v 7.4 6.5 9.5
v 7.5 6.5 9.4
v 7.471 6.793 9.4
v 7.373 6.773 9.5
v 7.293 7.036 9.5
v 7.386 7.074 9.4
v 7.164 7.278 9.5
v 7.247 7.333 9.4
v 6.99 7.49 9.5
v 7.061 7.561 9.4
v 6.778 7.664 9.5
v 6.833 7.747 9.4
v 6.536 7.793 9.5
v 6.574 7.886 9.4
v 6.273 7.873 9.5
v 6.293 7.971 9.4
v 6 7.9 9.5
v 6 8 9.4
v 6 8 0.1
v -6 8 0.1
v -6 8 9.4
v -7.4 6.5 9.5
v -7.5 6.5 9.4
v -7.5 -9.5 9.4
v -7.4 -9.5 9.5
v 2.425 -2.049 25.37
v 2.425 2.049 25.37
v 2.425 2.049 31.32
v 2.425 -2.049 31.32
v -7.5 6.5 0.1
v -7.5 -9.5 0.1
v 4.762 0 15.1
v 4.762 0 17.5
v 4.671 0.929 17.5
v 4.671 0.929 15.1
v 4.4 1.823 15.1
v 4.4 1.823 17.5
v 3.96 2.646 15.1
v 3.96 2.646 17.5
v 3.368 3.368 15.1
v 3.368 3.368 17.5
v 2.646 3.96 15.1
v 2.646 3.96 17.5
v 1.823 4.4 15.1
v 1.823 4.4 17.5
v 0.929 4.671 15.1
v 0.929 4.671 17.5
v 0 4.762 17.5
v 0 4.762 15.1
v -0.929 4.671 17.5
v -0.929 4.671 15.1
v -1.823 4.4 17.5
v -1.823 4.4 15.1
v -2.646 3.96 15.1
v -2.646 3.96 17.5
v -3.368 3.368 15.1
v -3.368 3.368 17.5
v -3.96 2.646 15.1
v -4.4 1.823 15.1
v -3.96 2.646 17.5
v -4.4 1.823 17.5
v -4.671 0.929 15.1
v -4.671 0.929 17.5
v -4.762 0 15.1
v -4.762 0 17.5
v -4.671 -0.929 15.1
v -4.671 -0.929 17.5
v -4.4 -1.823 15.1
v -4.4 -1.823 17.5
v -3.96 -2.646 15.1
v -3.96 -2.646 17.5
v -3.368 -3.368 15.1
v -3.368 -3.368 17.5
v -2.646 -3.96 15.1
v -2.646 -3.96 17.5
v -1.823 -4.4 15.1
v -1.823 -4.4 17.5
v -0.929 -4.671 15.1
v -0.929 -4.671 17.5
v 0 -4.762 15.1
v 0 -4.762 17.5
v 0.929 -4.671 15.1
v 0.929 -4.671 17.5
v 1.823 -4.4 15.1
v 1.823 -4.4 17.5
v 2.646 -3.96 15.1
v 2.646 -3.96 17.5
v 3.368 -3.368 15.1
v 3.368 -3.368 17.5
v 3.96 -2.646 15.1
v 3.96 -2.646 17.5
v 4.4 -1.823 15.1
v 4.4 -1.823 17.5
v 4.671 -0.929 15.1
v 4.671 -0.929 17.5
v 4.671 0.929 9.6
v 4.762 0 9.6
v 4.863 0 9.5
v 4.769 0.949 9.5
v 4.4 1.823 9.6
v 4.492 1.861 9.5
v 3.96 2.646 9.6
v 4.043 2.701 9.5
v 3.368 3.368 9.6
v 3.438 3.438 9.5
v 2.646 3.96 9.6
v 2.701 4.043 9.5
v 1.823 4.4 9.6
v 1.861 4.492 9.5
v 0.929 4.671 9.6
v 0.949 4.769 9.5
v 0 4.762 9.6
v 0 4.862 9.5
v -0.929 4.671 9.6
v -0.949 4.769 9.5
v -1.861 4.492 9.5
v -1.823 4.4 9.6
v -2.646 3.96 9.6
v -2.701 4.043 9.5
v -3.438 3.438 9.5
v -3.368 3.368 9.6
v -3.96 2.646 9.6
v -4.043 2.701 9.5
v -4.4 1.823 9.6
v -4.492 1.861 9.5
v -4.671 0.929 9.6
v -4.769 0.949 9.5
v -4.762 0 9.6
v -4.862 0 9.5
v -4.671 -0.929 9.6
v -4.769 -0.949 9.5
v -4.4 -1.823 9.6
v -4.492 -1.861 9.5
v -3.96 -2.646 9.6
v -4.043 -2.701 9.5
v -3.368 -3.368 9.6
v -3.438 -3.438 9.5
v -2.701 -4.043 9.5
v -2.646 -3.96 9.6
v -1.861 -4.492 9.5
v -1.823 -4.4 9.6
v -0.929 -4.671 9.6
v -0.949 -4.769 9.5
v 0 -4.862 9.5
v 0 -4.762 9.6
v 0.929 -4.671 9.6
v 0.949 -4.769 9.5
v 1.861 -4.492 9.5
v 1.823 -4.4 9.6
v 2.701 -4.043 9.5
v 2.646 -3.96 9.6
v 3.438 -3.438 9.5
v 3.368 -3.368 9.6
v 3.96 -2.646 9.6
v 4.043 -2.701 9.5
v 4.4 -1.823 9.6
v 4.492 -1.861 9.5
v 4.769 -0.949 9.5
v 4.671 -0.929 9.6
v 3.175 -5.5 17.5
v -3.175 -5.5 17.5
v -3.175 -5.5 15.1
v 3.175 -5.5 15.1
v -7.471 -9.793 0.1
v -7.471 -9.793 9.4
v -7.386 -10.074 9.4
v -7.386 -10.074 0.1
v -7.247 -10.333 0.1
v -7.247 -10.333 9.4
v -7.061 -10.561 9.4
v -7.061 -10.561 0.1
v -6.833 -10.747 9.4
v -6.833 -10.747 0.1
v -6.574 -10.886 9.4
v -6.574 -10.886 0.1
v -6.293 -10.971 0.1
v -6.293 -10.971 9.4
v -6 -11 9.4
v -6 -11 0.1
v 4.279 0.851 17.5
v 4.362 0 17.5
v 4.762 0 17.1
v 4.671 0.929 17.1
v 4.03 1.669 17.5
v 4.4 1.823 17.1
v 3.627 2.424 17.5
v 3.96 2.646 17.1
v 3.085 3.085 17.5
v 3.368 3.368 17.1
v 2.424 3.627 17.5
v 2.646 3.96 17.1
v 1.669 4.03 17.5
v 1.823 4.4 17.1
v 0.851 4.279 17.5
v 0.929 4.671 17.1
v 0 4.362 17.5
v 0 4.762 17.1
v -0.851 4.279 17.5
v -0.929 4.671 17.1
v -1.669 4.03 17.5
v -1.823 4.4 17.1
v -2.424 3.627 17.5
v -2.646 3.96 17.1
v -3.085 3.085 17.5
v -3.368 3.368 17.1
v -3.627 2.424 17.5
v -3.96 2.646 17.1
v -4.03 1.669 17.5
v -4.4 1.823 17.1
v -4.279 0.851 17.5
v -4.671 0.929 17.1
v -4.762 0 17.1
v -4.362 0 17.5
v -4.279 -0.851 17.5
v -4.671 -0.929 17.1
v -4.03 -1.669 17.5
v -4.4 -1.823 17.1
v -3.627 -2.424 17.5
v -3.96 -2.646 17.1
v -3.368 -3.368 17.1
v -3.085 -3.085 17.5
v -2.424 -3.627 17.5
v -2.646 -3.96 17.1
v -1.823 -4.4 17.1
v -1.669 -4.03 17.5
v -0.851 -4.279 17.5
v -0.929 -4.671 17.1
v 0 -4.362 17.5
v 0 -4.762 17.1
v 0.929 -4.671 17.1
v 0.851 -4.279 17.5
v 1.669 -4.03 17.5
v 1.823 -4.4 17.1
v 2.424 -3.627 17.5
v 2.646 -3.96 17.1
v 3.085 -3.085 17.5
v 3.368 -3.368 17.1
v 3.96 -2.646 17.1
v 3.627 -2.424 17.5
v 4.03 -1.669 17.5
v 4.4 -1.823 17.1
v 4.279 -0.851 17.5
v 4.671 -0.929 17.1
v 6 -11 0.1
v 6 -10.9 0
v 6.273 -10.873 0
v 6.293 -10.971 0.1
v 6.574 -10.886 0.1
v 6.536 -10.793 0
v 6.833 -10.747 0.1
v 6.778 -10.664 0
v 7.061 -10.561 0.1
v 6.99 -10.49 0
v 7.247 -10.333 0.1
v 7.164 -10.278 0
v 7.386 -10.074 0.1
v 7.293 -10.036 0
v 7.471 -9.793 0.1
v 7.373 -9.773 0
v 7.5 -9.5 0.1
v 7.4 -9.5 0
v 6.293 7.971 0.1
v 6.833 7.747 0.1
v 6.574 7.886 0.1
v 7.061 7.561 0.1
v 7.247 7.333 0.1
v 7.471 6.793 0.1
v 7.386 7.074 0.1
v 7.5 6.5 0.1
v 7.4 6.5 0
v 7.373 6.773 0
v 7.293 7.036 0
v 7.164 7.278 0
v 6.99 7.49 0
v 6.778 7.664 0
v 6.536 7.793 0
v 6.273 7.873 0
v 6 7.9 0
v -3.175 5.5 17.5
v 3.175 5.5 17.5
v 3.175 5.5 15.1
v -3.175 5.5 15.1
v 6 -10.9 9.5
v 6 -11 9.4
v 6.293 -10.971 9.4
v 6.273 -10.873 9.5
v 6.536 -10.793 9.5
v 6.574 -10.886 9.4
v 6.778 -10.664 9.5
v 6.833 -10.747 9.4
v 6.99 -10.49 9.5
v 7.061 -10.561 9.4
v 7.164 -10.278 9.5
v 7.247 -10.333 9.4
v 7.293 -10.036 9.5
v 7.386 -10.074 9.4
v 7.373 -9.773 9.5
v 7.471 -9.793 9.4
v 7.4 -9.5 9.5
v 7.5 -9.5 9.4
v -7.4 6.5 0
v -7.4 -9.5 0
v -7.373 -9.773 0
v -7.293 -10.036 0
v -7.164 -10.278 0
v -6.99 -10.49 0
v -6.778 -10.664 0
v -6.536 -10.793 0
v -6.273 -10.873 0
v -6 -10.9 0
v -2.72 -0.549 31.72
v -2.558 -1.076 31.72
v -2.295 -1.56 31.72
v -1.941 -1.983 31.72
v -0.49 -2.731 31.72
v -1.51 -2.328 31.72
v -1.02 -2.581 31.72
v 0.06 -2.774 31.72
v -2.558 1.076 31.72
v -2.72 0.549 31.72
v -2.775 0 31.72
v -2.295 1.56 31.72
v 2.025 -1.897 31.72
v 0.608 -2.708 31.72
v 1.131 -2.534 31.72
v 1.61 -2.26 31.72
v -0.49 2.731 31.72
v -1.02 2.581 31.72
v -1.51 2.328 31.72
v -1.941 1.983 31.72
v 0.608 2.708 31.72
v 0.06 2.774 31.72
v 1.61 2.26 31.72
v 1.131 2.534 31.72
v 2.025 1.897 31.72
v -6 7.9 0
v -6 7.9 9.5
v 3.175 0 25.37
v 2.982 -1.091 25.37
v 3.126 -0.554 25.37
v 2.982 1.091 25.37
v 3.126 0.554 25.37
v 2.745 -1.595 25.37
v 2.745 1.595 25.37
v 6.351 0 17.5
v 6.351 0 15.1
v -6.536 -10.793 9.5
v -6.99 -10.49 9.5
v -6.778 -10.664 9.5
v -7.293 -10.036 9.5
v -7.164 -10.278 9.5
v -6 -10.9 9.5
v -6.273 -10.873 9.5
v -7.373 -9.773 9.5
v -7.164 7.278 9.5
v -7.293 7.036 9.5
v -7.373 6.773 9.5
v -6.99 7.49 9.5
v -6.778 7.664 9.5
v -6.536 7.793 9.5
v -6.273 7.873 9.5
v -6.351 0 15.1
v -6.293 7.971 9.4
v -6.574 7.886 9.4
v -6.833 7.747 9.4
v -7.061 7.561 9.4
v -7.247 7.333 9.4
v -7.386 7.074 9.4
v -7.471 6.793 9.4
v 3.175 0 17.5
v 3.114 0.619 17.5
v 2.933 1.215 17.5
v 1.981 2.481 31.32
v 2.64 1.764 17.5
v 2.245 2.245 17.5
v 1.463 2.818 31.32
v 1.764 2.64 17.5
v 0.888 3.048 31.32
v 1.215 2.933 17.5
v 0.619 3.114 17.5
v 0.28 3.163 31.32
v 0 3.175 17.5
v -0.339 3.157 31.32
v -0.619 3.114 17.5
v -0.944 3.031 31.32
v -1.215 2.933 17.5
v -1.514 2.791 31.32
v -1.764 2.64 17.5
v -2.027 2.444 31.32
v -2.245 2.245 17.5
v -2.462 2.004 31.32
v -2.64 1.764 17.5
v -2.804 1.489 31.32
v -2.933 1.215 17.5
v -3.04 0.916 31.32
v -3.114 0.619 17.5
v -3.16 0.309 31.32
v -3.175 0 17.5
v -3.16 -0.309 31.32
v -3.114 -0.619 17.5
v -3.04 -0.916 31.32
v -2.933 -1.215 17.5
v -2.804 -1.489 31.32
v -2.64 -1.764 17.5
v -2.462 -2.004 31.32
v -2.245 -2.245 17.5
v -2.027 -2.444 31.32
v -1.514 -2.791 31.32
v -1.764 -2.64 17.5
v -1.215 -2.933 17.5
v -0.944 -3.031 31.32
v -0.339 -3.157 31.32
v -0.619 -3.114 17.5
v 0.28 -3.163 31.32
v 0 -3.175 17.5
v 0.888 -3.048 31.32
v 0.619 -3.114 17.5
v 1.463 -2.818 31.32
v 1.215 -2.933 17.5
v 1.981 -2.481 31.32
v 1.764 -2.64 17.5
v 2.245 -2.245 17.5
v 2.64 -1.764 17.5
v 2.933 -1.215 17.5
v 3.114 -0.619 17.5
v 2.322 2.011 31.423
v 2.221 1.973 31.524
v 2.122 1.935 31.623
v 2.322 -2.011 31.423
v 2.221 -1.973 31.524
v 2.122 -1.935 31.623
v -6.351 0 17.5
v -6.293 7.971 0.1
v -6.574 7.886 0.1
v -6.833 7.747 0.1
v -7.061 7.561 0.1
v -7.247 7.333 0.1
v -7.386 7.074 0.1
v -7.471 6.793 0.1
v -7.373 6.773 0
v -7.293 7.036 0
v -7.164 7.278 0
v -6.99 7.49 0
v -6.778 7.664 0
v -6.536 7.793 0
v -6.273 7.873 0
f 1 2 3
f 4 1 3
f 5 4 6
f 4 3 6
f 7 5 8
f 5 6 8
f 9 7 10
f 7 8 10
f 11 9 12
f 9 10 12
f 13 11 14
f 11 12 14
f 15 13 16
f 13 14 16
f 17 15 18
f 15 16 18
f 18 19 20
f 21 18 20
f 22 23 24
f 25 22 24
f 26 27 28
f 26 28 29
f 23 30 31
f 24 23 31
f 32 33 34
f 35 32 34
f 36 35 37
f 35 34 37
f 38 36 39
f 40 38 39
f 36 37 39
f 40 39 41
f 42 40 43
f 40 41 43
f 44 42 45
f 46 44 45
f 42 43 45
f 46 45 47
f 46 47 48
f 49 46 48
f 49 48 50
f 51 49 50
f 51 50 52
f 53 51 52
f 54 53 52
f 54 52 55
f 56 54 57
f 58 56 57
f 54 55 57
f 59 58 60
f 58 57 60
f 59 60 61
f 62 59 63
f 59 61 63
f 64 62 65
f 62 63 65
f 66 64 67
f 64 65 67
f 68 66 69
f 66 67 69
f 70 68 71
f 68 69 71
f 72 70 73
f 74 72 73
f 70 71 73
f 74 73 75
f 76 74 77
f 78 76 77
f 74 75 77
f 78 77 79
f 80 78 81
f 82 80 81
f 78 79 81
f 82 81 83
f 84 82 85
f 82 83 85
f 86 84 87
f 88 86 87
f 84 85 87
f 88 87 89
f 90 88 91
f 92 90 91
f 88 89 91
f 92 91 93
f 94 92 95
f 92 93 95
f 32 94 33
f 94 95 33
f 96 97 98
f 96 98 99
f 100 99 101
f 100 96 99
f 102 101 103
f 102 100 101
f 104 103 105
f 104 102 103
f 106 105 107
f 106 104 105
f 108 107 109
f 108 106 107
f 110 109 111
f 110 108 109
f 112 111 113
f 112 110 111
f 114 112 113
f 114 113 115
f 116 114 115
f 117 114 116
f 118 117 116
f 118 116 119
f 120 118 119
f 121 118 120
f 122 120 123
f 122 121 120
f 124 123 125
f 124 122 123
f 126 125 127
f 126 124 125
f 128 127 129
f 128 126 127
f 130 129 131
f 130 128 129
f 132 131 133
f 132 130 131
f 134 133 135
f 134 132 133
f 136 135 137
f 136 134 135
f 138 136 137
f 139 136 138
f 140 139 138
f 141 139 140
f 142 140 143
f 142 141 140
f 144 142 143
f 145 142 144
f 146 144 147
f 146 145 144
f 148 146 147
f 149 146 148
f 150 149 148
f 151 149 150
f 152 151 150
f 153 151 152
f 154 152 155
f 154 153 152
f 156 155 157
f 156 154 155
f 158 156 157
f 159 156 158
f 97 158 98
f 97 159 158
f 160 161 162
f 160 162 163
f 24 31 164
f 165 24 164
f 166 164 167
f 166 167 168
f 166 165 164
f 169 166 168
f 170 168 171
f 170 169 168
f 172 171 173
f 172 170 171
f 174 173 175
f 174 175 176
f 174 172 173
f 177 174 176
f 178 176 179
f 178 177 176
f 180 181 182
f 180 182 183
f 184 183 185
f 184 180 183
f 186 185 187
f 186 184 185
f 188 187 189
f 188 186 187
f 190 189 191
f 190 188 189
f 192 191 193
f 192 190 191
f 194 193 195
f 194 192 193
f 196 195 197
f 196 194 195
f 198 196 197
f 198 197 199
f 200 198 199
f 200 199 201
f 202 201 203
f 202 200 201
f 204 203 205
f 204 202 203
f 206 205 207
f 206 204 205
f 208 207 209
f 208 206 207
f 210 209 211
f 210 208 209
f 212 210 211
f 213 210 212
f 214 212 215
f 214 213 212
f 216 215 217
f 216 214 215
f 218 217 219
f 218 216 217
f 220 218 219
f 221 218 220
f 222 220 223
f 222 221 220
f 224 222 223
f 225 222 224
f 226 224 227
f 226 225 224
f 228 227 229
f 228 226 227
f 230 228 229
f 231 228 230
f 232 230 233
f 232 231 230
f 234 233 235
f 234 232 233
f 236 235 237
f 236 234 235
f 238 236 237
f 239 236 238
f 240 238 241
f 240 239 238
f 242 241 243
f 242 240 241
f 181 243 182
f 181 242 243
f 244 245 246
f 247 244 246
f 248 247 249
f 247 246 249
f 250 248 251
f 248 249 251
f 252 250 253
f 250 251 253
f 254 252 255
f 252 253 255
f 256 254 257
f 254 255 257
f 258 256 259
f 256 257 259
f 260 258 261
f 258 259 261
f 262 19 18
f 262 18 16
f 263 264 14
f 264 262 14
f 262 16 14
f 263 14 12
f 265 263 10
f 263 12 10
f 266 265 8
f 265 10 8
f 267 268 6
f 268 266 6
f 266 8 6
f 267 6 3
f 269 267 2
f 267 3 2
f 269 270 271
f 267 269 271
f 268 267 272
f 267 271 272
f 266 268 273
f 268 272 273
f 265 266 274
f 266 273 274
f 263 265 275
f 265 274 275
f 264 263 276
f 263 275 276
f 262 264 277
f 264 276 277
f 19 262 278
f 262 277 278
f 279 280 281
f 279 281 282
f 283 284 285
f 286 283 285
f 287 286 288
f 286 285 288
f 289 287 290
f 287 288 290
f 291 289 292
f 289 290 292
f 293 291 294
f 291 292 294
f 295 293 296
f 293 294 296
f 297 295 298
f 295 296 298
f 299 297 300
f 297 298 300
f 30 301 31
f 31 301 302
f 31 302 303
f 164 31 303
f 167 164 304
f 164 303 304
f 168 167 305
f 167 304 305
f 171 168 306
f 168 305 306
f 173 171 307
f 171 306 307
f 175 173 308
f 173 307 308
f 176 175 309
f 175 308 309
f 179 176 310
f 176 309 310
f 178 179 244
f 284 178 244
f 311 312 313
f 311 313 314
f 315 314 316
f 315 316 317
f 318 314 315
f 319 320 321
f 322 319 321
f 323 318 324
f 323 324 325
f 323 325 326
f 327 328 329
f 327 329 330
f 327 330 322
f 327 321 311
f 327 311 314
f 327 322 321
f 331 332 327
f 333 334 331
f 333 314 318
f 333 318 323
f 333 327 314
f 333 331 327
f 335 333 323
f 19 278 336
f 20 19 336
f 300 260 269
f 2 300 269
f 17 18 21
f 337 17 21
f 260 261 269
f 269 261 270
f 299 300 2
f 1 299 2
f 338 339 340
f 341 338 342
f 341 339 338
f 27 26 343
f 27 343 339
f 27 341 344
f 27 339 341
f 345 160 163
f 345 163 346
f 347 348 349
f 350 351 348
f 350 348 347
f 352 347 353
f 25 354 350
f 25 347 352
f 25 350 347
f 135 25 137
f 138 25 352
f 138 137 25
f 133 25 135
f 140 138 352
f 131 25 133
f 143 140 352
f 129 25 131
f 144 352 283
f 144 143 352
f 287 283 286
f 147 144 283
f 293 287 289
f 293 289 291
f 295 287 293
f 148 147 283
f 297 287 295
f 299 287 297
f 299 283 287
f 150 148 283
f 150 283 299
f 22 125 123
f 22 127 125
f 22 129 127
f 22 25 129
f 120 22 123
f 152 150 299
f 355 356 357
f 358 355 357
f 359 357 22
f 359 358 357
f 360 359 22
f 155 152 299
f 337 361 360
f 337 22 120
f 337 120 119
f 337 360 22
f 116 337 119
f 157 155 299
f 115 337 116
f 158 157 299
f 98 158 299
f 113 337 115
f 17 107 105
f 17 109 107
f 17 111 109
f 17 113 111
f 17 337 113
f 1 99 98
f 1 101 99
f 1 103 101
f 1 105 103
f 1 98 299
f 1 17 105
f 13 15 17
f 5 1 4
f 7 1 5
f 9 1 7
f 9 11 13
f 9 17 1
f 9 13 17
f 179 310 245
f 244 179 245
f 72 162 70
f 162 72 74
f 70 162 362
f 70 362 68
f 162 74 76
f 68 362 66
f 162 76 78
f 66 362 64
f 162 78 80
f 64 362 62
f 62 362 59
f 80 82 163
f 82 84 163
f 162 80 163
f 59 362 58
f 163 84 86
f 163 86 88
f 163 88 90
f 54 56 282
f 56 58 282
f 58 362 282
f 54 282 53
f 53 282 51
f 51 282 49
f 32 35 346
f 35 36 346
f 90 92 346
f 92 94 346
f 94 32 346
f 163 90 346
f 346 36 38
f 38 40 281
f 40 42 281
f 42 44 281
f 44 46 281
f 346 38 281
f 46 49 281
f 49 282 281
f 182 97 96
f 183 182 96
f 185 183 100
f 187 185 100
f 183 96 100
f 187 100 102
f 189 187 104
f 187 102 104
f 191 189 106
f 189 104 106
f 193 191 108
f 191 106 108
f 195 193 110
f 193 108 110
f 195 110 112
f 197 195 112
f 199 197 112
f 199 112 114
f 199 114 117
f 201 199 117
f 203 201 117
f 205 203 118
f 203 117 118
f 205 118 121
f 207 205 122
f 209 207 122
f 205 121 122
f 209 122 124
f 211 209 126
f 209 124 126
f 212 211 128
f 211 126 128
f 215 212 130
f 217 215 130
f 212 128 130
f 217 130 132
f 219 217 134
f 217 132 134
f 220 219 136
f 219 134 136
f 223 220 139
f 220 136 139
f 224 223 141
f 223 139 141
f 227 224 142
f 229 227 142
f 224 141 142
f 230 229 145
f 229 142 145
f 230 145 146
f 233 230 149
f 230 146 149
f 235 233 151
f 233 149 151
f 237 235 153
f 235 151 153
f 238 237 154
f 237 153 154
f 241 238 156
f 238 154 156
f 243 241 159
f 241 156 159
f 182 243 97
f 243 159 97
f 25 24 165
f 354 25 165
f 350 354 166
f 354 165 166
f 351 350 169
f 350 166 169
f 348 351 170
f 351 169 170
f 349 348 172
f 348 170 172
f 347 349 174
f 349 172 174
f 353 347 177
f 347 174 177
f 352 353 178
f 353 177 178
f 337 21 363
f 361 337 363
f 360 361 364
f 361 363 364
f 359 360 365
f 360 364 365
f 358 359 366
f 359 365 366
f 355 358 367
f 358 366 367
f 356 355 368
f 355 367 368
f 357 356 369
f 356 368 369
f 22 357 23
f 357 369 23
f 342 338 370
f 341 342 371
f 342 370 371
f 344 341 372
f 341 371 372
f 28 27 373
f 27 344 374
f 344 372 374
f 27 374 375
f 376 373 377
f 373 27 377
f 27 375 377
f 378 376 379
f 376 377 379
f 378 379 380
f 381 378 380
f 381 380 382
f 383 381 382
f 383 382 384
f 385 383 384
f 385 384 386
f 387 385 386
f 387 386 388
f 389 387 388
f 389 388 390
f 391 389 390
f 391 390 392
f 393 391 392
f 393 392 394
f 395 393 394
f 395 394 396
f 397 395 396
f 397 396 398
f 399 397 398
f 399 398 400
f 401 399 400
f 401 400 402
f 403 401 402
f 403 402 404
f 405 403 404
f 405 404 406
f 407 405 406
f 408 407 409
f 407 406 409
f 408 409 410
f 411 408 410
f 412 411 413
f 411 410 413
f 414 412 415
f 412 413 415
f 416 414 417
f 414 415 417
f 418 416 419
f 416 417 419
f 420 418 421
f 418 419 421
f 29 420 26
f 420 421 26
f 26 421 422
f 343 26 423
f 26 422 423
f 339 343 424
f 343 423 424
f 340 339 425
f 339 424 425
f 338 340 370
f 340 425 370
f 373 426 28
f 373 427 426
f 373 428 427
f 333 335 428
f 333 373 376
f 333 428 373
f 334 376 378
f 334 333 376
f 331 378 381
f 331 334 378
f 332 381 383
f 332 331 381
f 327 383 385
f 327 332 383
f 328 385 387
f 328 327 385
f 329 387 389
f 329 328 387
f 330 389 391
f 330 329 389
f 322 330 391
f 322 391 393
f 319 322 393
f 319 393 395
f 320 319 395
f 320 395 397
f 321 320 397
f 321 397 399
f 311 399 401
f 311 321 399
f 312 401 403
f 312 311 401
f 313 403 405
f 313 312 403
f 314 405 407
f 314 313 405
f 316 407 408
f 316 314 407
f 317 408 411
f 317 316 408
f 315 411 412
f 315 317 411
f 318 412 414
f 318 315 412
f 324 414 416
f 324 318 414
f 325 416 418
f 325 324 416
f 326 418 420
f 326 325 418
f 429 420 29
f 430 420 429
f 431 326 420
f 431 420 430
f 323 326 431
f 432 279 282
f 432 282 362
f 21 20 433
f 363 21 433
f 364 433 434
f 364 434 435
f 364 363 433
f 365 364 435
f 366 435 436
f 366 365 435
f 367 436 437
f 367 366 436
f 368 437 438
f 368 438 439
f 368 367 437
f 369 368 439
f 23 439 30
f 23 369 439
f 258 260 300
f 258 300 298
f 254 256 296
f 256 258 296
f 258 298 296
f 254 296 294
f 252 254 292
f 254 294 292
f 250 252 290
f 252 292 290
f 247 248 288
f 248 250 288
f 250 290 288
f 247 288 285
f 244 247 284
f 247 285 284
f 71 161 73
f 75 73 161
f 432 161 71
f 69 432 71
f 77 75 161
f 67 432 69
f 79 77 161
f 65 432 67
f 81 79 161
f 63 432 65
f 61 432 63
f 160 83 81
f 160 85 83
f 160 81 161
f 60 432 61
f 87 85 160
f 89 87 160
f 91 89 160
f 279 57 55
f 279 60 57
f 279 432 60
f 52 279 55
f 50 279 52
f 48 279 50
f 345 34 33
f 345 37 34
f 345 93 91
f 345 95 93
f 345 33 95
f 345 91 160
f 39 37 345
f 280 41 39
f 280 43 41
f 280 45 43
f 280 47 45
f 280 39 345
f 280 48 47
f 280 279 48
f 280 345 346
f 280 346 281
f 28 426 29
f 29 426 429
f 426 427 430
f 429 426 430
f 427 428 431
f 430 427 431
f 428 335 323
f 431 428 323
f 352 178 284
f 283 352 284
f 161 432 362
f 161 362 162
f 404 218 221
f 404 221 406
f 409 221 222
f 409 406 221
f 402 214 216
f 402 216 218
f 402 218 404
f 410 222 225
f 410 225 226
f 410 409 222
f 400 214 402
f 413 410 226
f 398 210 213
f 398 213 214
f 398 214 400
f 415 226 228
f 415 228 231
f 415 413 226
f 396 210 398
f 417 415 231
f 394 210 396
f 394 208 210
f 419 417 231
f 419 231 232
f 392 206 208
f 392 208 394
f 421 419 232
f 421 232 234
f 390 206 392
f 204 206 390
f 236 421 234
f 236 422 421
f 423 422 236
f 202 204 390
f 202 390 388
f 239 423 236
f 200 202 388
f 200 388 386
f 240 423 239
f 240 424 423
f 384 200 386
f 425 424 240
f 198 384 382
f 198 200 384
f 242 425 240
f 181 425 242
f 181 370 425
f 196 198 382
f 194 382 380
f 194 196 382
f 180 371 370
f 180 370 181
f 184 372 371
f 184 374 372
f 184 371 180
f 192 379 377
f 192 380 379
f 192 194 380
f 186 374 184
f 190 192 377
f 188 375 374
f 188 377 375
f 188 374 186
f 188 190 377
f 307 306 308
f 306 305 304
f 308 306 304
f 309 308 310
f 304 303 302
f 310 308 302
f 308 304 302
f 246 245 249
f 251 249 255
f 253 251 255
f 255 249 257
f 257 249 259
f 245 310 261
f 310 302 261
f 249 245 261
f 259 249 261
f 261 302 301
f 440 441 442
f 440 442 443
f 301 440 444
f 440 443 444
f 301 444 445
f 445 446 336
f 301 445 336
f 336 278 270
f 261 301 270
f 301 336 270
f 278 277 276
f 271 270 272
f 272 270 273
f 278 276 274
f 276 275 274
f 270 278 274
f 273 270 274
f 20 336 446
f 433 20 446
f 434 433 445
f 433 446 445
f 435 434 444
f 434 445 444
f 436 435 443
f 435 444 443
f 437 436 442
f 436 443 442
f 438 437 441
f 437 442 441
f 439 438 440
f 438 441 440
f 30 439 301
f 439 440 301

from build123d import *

# Parameters (mm, degrees)
F1_DEPTH  = 9.5
F2_R      = 4.7625
F3_DEPTH  = 8
F4_R      = 3.175
F5_DEPTH  = 14.22
F7_DEPTH  = 6.35
F8_SIZE   = 0.4
F9_R      = 1.5
F10_SIZE  = 0.1
F11_R     = 4.7625
F12_DEPTH = 2.4


with BuildPart() as f1:
    # F0 (on Top) → F1 (new body)
    with BuildSketch(Plane.XY):
        Polygon((7.5, 8), (-7.5, 8), (-7.5, -4.7), (-7.5, -11), (7.5, -11), (7.5, -8), align=None)
    extrude(amount=F1_DEPTH)

    # F2 (on face) → F3 (join)
    with BuildSketch(Plane.XY.offset(9.5)):
        Circle(F2_R)
    extrude(amount=F3_DEPTH)

    # F4 (on face) → F5 (join)
    with BuildSketch(Plane.XY.offset(17.5)):
        Circle(F4_R)
    extrude(amount=F5_DEPTH)

    # F6 (on face) → F7 (cut)
    with BuildSketch(Plane.XY.offset(31.72)):
        with BuildLine():
            Line((2.425, 2.0493901532), (2.425, -2.0493901532))
            ThreePointArc((2.425, -2.0493901532), (3.175, 0), (2.425, 2.0493901532))
        make_face()
    extrude(amount=-F7_DEPTH, mode=Mode.SUBTRACT)

    # F8
    f8_edges = [f1.edges().sort_by_distance(p)[0] for p in [
        (-3.175, 0, 31.72),
        (2.425, 0, 31.72),
        (-4.7625, 0, 17.5),
    ]]
    chamfer(f8_edges, length=F8_SIZE)

    # F9
    f9_edges = [f1.edges().sort_by_distance(p)[0] for p in [
        (-7.5, -11, 4.75),
        (7.5, -11, 4.75),
        (7.5, 8, 4.75),
        (-7.5, 8, 4.75),
    ]]
    fillet(f9_edges, radius=F9_R)

    # F10
    f10_edges = [f1.edges().sort_by_distance(p)[0] for p in [
        (0, 8, 9.5),
        (7.06066, 7.56066, 9.5),
        (-7.06066, 7.56066, 9.5),
        (7.5, -1.5, 9.5),
        (-7.5, -1.5, 9.5),
        (7.06066, -10.56066, 9.5),
        (-7.06066, -10.56066, 9.5),
        (0, -11, 9.5),
        (-4.7625, 0, 9.5),
        (0, 8, 0),
        (7.06066, 7.56066, 0),
        (-7.06066, 7.56066, 0),
        (7.5, -1.5, 0),
        (-7.5, -1.5, 0),
        (7.06066, -10.56066, 0),
        (-7.06066, -10.56066, 0),
        (0, -11, 0),
    ]]
    chamfer(f10_edges, length=F10_SIZE)


with BuildPart() as f12:
    # F11 (on face) → F12 (new body)
    with BuildSketch(Plane.XY.offset(17.5)):
        Polygon((3.1754264805, 5.5), (-3.1754264805, 5.5), (-6.3508529611, 0), (-3.1754264805, -5.5), (3.1754264805, -5.5), (6.3508529611, 0), align=None)
        Circle(F11_R, mode=Mode.SUBTRACT)
    extrude(amount=-F12_DEPTH)


solid = Compound([f1.part, f12.part])
